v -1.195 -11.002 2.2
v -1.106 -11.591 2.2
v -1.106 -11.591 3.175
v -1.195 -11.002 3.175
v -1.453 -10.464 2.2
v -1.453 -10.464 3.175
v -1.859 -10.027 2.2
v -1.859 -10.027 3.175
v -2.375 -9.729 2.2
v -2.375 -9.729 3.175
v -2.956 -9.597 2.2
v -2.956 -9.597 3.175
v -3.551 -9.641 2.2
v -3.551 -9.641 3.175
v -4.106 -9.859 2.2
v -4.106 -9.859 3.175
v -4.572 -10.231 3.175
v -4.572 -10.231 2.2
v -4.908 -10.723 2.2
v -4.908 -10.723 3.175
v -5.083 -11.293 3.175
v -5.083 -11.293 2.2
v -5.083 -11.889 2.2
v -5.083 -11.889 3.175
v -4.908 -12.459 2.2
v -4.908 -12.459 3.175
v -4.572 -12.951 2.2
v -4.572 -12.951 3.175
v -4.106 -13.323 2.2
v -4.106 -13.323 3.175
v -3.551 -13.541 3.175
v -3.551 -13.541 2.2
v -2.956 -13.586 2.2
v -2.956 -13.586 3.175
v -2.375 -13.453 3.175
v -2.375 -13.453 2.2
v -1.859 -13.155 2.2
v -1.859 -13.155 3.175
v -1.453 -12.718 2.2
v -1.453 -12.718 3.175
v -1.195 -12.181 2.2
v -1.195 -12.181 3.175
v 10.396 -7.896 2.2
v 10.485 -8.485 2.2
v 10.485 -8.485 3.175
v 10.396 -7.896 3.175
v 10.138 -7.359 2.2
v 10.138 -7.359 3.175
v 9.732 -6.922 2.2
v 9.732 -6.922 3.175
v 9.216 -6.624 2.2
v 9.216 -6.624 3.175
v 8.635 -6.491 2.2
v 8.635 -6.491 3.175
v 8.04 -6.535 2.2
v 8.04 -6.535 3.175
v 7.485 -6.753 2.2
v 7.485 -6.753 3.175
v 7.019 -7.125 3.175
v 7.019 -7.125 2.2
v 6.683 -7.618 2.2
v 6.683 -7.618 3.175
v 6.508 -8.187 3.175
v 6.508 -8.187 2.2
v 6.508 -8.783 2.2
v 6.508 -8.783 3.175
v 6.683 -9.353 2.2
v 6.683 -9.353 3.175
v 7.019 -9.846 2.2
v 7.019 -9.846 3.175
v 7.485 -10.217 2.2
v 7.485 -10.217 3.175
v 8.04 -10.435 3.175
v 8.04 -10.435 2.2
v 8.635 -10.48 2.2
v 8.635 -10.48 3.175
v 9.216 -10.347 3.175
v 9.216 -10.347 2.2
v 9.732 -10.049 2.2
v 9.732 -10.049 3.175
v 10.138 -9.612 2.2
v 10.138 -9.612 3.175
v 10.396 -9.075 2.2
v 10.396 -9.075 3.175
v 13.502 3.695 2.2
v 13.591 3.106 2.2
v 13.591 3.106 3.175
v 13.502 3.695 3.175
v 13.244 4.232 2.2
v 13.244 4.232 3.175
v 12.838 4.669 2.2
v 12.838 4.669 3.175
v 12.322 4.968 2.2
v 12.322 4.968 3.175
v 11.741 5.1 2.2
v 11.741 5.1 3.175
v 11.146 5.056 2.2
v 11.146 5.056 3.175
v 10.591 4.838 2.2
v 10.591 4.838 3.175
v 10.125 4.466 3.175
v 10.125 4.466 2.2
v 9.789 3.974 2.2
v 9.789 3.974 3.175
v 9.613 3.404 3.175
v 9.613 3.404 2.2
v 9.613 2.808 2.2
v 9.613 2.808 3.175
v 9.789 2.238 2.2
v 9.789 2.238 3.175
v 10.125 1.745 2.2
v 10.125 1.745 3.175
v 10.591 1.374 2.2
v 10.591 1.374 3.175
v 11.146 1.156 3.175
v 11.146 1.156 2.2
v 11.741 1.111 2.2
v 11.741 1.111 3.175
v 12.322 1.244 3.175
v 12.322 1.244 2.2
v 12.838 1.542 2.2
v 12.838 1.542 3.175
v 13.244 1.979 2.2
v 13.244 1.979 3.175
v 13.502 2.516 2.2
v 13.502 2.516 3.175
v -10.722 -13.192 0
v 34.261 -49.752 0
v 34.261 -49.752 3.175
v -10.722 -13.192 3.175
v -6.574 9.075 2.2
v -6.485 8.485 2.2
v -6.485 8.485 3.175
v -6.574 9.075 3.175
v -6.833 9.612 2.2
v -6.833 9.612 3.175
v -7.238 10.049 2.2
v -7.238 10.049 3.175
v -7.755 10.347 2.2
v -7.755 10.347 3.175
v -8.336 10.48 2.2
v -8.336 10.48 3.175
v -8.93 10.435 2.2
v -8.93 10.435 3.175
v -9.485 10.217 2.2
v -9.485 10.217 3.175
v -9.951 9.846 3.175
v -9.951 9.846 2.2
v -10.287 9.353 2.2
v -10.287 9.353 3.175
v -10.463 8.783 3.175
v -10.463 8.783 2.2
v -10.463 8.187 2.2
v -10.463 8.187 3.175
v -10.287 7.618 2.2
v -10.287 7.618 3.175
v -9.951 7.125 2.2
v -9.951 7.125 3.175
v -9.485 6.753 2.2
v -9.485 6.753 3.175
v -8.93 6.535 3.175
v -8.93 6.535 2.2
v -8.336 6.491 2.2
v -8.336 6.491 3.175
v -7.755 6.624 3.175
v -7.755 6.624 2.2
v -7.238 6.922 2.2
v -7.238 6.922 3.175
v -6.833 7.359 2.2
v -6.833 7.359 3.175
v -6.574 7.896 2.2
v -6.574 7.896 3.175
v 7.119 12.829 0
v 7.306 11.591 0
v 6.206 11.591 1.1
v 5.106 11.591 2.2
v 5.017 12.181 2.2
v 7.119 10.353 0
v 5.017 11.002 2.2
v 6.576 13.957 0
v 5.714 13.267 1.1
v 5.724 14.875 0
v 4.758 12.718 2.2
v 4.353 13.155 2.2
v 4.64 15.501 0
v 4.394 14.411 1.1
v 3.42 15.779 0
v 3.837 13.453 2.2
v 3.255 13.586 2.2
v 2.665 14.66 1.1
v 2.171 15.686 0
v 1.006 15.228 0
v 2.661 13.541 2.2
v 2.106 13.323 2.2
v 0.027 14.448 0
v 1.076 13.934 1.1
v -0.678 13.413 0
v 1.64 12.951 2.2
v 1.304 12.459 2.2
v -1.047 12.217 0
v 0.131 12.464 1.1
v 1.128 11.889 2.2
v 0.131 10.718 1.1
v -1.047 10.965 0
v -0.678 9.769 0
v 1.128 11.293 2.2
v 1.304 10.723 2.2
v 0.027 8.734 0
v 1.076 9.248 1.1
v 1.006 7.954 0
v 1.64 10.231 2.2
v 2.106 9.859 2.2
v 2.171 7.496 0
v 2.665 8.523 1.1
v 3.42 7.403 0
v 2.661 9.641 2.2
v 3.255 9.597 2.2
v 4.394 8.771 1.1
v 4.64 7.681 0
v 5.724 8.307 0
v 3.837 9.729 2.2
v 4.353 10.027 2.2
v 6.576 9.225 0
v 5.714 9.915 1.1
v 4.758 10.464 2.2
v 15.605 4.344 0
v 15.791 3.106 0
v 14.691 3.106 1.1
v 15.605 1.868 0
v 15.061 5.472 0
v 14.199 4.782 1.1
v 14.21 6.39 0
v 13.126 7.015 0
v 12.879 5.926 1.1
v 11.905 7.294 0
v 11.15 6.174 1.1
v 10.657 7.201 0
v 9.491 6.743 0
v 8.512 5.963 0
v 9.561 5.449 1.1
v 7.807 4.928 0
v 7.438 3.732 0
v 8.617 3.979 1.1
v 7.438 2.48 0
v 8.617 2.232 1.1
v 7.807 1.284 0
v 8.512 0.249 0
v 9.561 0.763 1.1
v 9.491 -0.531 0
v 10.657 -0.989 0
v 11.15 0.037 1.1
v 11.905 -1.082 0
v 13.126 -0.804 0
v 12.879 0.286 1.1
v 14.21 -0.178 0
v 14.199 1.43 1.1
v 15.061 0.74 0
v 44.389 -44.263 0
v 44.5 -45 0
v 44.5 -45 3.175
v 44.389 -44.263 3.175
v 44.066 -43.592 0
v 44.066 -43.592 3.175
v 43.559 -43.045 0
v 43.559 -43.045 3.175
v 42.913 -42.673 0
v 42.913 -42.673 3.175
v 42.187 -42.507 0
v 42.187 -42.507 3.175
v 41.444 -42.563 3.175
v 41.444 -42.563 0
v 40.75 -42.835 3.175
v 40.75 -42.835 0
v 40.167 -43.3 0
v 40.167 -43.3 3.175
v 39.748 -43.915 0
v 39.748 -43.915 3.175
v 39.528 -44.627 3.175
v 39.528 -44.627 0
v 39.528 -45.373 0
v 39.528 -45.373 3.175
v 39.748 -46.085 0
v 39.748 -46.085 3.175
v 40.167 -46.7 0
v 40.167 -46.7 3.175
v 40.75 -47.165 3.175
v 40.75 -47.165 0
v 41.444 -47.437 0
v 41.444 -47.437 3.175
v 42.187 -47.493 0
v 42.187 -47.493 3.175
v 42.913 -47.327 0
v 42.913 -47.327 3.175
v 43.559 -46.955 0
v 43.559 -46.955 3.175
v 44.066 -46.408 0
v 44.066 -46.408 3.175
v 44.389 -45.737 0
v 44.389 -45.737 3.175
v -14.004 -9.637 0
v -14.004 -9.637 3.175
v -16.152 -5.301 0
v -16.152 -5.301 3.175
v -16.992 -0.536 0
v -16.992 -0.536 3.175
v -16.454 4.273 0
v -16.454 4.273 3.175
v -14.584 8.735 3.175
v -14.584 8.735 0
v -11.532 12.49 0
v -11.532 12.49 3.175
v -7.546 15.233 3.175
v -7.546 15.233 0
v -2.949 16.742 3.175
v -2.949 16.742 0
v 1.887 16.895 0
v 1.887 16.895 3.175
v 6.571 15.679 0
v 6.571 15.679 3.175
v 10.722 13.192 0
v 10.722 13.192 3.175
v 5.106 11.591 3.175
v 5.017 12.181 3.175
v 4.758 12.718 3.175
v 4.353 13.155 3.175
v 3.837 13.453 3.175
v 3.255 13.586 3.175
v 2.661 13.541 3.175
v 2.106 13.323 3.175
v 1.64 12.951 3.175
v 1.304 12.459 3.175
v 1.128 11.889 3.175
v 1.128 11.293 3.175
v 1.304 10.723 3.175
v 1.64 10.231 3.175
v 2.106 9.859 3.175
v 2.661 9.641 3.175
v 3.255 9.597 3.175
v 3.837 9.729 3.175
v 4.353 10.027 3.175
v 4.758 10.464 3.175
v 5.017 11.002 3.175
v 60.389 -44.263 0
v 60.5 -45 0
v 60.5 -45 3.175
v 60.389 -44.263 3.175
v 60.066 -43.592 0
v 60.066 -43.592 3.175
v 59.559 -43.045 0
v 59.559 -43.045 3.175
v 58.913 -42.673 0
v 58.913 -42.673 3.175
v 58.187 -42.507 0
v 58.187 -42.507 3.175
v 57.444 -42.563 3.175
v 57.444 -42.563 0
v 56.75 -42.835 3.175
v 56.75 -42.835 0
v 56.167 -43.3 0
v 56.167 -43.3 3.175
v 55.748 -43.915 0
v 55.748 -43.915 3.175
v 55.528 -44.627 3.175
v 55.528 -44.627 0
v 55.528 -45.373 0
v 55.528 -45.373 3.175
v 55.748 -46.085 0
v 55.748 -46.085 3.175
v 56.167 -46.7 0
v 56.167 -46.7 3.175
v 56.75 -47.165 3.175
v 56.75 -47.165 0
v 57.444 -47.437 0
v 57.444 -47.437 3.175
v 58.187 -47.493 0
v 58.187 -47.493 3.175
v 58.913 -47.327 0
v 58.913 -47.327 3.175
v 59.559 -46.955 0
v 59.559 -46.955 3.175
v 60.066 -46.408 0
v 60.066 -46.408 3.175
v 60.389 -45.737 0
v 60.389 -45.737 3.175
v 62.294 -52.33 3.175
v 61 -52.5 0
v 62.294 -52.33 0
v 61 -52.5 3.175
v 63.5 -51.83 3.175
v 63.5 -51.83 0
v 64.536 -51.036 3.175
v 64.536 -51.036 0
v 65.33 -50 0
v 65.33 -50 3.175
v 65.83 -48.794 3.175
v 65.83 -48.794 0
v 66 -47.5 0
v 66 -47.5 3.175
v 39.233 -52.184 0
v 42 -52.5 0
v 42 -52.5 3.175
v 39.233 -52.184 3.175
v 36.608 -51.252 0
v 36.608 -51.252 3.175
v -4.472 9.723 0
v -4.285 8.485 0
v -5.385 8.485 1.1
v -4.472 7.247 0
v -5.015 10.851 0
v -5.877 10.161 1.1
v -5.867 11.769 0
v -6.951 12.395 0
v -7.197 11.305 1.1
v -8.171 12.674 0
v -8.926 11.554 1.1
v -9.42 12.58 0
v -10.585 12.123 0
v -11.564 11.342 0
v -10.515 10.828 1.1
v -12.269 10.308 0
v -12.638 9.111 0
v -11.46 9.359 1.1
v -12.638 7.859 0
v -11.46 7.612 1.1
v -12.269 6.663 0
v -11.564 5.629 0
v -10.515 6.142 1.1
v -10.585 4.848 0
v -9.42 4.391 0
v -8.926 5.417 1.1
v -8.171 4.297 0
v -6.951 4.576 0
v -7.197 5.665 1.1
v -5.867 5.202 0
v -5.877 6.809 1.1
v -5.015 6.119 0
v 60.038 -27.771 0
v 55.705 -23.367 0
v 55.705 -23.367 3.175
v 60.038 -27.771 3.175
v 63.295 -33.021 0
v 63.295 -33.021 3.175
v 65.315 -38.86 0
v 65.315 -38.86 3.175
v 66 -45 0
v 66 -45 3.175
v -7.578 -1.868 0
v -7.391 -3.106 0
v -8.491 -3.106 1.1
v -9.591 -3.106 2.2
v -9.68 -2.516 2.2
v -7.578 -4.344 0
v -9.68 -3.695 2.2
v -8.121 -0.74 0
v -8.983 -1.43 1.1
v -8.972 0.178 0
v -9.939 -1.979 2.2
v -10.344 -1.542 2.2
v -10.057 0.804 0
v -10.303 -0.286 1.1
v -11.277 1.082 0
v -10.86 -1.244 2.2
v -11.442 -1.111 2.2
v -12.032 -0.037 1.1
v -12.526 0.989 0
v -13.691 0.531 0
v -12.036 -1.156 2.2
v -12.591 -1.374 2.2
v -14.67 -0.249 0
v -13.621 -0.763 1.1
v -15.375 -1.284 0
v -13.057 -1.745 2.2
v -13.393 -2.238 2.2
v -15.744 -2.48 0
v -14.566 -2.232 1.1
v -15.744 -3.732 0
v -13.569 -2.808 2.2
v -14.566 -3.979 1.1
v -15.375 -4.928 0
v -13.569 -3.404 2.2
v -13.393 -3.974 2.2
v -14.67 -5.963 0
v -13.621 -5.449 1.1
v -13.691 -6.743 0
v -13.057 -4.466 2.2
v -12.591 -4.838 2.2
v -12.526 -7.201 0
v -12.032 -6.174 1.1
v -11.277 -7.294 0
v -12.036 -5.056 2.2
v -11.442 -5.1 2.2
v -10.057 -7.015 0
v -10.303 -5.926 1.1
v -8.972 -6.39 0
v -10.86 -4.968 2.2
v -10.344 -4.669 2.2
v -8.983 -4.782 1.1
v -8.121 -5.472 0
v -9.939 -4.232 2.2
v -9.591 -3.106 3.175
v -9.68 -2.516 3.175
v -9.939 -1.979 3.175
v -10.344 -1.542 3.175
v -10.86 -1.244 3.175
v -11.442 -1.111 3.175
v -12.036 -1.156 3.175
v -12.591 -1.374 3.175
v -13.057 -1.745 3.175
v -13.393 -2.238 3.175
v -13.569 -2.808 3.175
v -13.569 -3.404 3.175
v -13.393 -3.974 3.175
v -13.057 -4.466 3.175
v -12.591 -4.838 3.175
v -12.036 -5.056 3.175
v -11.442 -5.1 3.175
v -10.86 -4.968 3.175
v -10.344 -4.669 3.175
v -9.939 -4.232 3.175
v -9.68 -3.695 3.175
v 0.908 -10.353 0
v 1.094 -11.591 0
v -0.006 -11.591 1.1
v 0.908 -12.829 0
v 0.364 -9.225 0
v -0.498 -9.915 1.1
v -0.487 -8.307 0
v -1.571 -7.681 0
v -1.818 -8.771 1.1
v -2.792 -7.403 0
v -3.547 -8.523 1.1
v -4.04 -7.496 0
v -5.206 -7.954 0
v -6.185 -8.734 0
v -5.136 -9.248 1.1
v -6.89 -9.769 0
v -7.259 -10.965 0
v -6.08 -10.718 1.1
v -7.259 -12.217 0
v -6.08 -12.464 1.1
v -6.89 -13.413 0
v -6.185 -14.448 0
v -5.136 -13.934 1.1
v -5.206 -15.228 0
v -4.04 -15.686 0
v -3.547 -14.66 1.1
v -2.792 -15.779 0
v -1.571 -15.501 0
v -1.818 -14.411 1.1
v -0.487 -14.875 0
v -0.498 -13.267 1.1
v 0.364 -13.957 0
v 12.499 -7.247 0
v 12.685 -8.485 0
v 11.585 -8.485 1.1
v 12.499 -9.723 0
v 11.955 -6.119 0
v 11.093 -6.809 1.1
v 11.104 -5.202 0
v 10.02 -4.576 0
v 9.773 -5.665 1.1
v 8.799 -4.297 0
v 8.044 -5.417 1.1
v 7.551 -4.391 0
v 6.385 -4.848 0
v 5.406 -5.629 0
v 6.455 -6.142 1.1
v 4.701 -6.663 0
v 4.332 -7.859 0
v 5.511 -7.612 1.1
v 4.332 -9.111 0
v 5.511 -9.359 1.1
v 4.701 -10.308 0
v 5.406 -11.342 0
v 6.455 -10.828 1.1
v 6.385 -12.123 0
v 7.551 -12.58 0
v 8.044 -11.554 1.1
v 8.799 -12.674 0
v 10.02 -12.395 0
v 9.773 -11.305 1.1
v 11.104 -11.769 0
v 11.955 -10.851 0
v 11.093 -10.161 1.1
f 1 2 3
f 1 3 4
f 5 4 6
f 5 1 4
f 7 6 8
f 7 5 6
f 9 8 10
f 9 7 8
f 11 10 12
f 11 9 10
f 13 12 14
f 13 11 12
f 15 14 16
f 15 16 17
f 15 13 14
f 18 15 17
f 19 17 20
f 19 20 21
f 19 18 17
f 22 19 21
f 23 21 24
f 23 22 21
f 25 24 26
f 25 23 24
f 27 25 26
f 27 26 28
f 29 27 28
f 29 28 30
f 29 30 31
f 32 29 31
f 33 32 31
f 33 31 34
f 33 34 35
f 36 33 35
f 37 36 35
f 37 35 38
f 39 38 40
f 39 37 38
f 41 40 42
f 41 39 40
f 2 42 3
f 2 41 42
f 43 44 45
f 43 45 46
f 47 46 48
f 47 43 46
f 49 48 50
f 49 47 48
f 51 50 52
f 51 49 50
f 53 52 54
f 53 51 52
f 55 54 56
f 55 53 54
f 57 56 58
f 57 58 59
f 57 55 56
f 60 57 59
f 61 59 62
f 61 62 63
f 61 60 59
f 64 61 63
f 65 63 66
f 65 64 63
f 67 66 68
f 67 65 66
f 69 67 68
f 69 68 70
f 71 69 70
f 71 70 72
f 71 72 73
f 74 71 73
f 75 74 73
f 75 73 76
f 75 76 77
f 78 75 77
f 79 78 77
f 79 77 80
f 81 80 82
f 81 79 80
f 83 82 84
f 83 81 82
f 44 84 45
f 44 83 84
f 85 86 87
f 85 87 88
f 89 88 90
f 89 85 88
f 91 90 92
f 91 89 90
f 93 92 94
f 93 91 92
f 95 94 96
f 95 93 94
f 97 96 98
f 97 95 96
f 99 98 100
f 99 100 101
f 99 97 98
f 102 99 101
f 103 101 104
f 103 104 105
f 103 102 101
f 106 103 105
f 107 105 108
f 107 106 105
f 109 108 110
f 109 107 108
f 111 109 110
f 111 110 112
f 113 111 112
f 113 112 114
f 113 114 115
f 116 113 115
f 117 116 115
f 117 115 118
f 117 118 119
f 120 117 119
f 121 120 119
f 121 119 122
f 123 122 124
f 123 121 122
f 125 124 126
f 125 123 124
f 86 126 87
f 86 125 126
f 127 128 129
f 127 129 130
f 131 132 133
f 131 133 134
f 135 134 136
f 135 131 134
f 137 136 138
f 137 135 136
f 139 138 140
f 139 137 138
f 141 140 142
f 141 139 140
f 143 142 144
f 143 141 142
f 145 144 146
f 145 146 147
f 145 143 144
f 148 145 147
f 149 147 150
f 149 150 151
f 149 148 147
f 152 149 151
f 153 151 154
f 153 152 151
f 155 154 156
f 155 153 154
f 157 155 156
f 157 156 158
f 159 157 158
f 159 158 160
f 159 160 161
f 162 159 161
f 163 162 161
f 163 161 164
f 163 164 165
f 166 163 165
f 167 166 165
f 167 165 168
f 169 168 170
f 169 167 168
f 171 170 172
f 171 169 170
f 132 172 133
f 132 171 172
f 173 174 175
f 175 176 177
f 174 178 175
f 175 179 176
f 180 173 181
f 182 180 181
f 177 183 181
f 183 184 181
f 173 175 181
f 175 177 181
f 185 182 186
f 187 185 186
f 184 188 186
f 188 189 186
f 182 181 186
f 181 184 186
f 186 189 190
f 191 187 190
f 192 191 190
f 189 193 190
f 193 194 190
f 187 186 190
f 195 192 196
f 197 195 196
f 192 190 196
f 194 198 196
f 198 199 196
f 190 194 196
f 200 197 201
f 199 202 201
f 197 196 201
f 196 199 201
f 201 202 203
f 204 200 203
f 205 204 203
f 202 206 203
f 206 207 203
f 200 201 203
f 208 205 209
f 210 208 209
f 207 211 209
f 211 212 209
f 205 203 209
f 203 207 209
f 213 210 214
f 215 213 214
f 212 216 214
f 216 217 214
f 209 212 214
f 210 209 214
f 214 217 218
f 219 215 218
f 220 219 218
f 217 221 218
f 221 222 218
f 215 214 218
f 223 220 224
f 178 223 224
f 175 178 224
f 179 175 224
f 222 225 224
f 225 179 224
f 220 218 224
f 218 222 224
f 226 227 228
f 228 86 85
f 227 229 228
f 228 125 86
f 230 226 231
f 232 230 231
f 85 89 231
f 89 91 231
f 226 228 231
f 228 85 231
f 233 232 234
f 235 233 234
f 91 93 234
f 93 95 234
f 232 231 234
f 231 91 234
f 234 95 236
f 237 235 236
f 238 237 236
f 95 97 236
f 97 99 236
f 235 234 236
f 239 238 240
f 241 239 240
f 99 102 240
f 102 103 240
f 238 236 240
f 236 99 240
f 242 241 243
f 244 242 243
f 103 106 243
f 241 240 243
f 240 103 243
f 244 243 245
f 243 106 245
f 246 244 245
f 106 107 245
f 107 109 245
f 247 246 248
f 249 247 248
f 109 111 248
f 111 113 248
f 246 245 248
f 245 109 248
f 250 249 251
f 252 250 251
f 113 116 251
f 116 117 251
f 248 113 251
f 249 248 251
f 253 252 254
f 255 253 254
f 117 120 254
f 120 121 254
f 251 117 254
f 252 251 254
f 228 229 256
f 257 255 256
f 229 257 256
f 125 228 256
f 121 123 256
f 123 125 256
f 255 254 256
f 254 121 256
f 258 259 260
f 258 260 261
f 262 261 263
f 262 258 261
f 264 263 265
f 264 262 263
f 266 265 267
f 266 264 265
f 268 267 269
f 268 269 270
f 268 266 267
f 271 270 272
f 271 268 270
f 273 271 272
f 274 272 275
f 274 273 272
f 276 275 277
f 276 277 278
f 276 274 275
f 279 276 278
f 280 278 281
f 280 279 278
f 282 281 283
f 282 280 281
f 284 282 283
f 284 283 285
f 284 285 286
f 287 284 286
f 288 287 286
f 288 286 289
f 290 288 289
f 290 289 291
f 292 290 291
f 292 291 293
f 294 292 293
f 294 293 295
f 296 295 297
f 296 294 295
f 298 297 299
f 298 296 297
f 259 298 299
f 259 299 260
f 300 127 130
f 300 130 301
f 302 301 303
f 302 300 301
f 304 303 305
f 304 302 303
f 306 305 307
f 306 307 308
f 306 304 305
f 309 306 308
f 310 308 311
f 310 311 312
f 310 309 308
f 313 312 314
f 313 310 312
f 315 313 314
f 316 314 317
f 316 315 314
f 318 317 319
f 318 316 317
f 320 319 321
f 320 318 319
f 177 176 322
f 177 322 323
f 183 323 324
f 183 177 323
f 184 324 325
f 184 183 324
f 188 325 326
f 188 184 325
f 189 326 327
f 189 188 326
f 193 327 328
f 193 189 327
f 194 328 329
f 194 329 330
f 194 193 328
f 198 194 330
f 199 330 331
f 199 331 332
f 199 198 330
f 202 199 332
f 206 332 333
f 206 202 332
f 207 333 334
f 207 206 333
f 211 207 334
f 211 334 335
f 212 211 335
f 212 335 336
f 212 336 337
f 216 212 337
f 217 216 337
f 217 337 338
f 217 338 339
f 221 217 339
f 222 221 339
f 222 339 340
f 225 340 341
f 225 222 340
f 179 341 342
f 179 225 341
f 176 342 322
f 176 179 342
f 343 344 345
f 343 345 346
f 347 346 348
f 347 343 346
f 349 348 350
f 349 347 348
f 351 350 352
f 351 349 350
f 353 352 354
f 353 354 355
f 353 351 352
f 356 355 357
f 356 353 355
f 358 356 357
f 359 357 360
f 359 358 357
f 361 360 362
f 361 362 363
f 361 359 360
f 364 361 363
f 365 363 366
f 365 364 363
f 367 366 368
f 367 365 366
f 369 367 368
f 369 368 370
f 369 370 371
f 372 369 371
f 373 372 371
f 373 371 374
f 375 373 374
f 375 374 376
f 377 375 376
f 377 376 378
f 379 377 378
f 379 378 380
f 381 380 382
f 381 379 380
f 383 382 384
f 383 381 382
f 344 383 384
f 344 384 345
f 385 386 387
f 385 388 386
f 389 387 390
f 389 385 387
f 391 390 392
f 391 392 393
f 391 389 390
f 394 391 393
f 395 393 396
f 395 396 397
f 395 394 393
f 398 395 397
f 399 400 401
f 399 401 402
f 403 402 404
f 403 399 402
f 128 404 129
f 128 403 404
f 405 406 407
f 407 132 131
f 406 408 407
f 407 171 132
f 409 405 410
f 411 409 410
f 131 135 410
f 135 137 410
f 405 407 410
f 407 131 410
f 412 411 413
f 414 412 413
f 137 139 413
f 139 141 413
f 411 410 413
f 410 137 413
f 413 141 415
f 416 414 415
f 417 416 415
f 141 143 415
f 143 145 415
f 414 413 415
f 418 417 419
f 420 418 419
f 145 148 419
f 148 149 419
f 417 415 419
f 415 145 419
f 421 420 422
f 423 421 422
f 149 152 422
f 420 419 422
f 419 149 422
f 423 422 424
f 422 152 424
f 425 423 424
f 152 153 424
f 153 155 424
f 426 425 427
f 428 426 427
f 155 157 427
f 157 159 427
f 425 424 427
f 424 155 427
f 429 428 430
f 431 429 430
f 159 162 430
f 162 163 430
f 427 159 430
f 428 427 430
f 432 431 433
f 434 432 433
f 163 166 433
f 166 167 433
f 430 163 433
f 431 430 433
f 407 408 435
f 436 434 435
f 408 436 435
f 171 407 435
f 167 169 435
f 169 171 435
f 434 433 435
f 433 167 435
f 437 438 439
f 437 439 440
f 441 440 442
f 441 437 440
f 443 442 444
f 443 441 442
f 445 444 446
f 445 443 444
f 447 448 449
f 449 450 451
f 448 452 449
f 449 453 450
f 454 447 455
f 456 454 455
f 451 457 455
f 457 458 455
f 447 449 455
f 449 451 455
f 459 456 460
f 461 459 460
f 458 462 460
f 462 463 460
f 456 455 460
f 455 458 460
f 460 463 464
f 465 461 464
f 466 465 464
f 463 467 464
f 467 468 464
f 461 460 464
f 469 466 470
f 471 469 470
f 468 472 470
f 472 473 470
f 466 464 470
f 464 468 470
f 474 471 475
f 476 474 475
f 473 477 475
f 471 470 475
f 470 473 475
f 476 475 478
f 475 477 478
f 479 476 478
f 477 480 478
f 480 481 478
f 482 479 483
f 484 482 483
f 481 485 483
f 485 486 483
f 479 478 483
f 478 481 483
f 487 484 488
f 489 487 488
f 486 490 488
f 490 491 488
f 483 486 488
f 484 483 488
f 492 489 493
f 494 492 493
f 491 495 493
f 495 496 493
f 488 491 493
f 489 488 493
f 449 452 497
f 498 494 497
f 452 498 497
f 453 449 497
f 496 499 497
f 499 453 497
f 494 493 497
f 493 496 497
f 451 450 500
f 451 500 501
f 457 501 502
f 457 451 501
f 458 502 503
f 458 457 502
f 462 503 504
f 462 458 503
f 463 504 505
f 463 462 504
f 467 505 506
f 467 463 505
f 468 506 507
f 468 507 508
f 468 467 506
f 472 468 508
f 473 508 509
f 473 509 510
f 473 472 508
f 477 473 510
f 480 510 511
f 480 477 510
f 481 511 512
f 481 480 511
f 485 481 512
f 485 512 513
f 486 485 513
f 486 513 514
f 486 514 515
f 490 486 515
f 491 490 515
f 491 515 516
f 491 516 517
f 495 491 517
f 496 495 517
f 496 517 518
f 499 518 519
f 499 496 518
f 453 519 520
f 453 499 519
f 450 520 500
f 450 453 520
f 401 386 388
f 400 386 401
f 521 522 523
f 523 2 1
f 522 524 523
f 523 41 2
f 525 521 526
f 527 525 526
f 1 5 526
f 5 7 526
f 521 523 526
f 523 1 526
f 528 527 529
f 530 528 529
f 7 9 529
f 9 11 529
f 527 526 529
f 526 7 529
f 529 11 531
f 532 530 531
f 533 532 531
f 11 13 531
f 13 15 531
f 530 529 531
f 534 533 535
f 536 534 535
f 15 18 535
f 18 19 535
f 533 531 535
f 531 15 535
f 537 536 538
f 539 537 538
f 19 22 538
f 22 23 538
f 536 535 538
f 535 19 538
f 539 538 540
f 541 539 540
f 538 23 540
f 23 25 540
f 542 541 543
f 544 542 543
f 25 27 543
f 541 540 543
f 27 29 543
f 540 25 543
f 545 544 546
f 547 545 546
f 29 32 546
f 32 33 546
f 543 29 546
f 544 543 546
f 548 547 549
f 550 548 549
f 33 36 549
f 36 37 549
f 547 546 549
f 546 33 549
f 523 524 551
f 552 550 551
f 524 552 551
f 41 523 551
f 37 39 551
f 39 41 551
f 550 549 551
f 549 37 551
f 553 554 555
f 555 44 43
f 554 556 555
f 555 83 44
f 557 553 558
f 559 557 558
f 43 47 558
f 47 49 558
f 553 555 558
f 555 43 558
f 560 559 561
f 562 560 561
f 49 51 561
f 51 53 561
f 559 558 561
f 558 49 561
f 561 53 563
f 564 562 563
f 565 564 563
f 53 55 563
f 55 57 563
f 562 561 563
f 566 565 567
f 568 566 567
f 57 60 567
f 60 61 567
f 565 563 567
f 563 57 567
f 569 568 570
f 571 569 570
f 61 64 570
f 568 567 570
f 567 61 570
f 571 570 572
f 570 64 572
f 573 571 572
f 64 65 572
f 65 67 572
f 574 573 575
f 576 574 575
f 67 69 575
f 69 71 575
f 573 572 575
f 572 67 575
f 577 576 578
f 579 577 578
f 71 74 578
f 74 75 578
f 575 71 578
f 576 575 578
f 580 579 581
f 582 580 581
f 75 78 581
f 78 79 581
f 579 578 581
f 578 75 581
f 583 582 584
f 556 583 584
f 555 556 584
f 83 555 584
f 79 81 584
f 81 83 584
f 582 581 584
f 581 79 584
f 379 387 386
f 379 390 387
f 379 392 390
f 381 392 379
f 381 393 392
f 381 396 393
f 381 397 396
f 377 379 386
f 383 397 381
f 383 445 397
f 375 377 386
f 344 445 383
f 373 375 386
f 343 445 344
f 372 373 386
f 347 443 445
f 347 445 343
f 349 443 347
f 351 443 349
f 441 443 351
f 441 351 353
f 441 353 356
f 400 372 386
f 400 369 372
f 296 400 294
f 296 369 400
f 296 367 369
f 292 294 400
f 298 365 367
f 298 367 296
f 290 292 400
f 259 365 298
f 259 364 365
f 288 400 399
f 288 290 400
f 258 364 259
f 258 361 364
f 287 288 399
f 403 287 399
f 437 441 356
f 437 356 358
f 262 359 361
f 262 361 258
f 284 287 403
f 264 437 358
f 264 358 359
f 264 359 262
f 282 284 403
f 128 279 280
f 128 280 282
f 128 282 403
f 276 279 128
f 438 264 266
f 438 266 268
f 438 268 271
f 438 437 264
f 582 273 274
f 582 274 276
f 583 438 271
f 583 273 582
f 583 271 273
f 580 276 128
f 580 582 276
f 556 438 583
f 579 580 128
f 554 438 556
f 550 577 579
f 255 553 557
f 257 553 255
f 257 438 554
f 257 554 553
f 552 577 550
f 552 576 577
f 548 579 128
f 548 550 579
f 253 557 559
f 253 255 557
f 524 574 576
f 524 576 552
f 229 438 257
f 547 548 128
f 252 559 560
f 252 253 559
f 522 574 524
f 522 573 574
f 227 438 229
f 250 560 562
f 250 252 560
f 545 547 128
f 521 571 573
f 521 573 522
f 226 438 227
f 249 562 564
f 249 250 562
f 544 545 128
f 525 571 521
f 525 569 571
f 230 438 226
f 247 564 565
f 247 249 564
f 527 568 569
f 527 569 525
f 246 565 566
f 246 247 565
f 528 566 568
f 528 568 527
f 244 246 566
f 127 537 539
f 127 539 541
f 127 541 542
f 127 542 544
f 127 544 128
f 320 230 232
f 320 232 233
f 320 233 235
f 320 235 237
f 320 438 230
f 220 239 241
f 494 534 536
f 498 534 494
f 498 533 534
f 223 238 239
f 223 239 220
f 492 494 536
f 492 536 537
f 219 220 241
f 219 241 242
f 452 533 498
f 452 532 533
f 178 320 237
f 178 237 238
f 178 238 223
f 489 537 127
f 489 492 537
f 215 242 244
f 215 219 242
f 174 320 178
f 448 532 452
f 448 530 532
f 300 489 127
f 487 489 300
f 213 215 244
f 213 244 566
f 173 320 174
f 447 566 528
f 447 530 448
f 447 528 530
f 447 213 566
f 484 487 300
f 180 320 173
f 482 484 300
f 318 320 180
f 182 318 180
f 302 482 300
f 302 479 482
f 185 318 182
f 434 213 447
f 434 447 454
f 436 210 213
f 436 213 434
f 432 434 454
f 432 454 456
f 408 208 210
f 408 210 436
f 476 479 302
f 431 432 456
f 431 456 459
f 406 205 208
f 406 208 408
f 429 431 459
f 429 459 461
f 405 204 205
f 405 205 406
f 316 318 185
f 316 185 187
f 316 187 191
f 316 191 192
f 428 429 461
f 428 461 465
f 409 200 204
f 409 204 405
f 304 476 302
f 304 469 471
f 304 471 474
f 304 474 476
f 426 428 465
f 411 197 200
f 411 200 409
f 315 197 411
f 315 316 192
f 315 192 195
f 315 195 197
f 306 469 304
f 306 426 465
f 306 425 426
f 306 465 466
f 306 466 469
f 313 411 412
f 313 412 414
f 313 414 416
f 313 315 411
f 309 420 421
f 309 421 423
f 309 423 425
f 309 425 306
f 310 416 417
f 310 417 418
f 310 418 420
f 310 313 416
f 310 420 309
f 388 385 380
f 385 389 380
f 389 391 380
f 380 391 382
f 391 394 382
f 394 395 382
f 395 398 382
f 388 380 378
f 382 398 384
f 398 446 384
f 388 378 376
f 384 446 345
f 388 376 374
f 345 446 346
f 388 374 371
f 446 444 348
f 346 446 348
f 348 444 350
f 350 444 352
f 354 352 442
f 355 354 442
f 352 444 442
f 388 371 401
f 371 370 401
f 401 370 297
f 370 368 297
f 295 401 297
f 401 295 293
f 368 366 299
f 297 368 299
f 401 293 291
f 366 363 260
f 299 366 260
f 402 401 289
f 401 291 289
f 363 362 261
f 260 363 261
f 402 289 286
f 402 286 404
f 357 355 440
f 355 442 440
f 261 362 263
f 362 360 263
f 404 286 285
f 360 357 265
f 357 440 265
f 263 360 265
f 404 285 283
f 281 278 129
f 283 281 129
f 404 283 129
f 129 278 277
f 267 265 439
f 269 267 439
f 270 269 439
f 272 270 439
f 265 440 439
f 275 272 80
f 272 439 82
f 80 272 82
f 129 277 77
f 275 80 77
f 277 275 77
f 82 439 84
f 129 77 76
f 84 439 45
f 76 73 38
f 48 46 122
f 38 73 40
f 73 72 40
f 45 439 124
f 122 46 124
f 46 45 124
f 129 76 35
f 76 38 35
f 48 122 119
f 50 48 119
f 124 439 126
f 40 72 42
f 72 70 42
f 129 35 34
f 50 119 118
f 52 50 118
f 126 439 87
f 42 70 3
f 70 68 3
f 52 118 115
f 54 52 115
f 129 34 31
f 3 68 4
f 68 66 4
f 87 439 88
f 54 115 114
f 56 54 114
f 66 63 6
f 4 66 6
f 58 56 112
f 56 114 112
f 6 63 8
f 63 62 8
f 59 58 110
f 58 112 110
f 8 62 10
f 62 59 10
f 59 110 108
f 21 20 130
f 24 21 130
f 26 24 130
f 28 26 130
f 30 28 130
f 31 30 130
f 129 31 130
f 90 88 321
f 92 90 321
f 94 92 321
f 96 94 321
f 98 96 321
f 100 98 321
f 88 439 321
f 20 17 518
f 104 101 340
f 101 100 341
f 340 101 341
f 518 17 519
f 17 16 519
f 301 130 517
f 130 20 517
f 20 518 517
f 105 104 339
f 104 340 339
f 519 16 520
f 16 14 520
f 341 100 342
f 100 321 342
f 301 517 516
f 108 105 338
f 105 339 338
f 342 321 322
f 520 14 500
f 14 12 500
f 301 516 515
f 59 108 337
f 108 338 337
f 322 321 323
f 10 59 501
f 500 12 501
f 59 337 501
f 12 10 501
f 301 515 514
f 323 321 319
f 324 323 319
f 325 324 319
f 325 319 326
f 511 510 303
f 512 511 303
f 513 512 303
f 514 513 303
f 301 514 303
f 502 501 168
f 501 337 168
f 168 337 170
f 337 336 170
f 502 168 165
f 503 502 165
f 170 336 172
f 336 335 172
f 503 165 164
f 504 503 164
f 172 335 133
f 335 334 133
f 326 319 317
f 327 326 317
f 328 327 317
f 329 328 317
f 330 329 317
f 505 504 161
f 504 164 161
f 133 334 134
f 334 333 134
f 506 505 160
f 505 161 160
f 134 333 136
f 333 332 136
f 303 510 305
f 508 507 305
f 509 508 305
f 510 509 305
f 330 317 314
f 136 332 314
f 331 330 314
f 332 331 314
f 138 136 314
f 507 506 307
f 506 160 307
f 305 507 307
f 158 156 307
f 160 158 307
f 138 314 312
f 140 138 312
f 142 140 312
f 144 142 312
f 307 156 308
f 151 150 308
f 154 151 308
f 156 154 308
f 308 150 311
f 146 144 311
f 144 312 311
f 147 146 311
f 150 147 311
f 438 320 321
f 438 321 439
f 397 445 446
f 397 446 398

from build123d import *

# Parameters (mm, degrees)
SKETCH1_R           = 2
SKETCH1_R_2         = 2.5
BOSS_EXTRUDE1_DEPTH = 3.175
FILLET1_R           = 5
CHAMFER1_SIZE       = 2.2


with BuildPart() as part:
    # Sketch1 → Boss-Extrude1 (new body)
    with BuildSketch(Plane.XY):
        with BuildLine():
            Line((34.261326859, -49.751843123), (-10.721932331, -13.1924284))
            ThreePointArc((-10.721932331, -13.1924284), (-13.1924284, 10.721932331), (10.721932331, 13.1924284))
            Line((10.721932331, 13.1924284), (55.705191521, -23.366986323))
            ThreePointArc((55.705191521, -23.366986323), (63.295065064, -33.021160716), (66, -45))
            Line((66, -45), (66, -52.5))
            Line((66, -52.5), (42, -52.5))
            ThreePointArc((42, -52.5), (37.893924373, -51.792566974), (34.261326859, -49.751843123))
        make_face()
        with Locations((-8.485281374, 8.485281374)):
            Circle(SKETCH1_R, mode=Mode.SUBTRACT)
        with Locations((3.105828541, 11.591109915)):
            Circle(SKETCH1_R, mode=Mode.SUBTRACT)
        with Locations((11.591109915, 3.105828541)):
            Circle(SKETCH1_R, mode=Mode.SUBTRACT)
        with Locations((8.485281374, -8.485281374)):
            Circle(SKETCH1_R, mode=Mode.SUBTRACT)
        with Locations((42, -45)):
            Circle(SKETCH1_R_2, mode=Mode.SUBTRACT)
        with Locations((58, -45)):
            Circle(SKETCH1_R_2, mode=Mode.SUBTRACT)
        with Locations((-3.105828541, -11.591109915)):
            Circle(SKETCH1_R, mode=Mode.SUBTRACT)
        with Locations((-11.591109915, -3.105828541)):
            Circle(SKETCH1_R, mode=Mode.SUBTRACT)
    extrude(amount=BOSS_EXTRUDE1_DEPTH)

    # Fillet1
    fillet1_edges = [part.edges().sort_by_distance(p)[0] for p in [
        (66, -52.5, 1.5875),
    ]]
    fillet(fillet1_edges, radius=FILLET1_R)

    # Chamfer1
    chamfer1_edges = [part.edges().sort_by_distance(p)[0] for p in [
        (-10.485281374, 8.485281374, 0),
        (1.105828541, 11.591109915, 0),
        (9.591109915, 3.105828541, 0),
        (6.485281374, -8.485281374, 0),
        (-5.105828541, -11.591109915, 0),
        (-13.591109915, -3.105828541, 0),
    ]]
    chamfer(chamfer1_edges, length=CHAMFER1_SIZE)


solid = part.part
